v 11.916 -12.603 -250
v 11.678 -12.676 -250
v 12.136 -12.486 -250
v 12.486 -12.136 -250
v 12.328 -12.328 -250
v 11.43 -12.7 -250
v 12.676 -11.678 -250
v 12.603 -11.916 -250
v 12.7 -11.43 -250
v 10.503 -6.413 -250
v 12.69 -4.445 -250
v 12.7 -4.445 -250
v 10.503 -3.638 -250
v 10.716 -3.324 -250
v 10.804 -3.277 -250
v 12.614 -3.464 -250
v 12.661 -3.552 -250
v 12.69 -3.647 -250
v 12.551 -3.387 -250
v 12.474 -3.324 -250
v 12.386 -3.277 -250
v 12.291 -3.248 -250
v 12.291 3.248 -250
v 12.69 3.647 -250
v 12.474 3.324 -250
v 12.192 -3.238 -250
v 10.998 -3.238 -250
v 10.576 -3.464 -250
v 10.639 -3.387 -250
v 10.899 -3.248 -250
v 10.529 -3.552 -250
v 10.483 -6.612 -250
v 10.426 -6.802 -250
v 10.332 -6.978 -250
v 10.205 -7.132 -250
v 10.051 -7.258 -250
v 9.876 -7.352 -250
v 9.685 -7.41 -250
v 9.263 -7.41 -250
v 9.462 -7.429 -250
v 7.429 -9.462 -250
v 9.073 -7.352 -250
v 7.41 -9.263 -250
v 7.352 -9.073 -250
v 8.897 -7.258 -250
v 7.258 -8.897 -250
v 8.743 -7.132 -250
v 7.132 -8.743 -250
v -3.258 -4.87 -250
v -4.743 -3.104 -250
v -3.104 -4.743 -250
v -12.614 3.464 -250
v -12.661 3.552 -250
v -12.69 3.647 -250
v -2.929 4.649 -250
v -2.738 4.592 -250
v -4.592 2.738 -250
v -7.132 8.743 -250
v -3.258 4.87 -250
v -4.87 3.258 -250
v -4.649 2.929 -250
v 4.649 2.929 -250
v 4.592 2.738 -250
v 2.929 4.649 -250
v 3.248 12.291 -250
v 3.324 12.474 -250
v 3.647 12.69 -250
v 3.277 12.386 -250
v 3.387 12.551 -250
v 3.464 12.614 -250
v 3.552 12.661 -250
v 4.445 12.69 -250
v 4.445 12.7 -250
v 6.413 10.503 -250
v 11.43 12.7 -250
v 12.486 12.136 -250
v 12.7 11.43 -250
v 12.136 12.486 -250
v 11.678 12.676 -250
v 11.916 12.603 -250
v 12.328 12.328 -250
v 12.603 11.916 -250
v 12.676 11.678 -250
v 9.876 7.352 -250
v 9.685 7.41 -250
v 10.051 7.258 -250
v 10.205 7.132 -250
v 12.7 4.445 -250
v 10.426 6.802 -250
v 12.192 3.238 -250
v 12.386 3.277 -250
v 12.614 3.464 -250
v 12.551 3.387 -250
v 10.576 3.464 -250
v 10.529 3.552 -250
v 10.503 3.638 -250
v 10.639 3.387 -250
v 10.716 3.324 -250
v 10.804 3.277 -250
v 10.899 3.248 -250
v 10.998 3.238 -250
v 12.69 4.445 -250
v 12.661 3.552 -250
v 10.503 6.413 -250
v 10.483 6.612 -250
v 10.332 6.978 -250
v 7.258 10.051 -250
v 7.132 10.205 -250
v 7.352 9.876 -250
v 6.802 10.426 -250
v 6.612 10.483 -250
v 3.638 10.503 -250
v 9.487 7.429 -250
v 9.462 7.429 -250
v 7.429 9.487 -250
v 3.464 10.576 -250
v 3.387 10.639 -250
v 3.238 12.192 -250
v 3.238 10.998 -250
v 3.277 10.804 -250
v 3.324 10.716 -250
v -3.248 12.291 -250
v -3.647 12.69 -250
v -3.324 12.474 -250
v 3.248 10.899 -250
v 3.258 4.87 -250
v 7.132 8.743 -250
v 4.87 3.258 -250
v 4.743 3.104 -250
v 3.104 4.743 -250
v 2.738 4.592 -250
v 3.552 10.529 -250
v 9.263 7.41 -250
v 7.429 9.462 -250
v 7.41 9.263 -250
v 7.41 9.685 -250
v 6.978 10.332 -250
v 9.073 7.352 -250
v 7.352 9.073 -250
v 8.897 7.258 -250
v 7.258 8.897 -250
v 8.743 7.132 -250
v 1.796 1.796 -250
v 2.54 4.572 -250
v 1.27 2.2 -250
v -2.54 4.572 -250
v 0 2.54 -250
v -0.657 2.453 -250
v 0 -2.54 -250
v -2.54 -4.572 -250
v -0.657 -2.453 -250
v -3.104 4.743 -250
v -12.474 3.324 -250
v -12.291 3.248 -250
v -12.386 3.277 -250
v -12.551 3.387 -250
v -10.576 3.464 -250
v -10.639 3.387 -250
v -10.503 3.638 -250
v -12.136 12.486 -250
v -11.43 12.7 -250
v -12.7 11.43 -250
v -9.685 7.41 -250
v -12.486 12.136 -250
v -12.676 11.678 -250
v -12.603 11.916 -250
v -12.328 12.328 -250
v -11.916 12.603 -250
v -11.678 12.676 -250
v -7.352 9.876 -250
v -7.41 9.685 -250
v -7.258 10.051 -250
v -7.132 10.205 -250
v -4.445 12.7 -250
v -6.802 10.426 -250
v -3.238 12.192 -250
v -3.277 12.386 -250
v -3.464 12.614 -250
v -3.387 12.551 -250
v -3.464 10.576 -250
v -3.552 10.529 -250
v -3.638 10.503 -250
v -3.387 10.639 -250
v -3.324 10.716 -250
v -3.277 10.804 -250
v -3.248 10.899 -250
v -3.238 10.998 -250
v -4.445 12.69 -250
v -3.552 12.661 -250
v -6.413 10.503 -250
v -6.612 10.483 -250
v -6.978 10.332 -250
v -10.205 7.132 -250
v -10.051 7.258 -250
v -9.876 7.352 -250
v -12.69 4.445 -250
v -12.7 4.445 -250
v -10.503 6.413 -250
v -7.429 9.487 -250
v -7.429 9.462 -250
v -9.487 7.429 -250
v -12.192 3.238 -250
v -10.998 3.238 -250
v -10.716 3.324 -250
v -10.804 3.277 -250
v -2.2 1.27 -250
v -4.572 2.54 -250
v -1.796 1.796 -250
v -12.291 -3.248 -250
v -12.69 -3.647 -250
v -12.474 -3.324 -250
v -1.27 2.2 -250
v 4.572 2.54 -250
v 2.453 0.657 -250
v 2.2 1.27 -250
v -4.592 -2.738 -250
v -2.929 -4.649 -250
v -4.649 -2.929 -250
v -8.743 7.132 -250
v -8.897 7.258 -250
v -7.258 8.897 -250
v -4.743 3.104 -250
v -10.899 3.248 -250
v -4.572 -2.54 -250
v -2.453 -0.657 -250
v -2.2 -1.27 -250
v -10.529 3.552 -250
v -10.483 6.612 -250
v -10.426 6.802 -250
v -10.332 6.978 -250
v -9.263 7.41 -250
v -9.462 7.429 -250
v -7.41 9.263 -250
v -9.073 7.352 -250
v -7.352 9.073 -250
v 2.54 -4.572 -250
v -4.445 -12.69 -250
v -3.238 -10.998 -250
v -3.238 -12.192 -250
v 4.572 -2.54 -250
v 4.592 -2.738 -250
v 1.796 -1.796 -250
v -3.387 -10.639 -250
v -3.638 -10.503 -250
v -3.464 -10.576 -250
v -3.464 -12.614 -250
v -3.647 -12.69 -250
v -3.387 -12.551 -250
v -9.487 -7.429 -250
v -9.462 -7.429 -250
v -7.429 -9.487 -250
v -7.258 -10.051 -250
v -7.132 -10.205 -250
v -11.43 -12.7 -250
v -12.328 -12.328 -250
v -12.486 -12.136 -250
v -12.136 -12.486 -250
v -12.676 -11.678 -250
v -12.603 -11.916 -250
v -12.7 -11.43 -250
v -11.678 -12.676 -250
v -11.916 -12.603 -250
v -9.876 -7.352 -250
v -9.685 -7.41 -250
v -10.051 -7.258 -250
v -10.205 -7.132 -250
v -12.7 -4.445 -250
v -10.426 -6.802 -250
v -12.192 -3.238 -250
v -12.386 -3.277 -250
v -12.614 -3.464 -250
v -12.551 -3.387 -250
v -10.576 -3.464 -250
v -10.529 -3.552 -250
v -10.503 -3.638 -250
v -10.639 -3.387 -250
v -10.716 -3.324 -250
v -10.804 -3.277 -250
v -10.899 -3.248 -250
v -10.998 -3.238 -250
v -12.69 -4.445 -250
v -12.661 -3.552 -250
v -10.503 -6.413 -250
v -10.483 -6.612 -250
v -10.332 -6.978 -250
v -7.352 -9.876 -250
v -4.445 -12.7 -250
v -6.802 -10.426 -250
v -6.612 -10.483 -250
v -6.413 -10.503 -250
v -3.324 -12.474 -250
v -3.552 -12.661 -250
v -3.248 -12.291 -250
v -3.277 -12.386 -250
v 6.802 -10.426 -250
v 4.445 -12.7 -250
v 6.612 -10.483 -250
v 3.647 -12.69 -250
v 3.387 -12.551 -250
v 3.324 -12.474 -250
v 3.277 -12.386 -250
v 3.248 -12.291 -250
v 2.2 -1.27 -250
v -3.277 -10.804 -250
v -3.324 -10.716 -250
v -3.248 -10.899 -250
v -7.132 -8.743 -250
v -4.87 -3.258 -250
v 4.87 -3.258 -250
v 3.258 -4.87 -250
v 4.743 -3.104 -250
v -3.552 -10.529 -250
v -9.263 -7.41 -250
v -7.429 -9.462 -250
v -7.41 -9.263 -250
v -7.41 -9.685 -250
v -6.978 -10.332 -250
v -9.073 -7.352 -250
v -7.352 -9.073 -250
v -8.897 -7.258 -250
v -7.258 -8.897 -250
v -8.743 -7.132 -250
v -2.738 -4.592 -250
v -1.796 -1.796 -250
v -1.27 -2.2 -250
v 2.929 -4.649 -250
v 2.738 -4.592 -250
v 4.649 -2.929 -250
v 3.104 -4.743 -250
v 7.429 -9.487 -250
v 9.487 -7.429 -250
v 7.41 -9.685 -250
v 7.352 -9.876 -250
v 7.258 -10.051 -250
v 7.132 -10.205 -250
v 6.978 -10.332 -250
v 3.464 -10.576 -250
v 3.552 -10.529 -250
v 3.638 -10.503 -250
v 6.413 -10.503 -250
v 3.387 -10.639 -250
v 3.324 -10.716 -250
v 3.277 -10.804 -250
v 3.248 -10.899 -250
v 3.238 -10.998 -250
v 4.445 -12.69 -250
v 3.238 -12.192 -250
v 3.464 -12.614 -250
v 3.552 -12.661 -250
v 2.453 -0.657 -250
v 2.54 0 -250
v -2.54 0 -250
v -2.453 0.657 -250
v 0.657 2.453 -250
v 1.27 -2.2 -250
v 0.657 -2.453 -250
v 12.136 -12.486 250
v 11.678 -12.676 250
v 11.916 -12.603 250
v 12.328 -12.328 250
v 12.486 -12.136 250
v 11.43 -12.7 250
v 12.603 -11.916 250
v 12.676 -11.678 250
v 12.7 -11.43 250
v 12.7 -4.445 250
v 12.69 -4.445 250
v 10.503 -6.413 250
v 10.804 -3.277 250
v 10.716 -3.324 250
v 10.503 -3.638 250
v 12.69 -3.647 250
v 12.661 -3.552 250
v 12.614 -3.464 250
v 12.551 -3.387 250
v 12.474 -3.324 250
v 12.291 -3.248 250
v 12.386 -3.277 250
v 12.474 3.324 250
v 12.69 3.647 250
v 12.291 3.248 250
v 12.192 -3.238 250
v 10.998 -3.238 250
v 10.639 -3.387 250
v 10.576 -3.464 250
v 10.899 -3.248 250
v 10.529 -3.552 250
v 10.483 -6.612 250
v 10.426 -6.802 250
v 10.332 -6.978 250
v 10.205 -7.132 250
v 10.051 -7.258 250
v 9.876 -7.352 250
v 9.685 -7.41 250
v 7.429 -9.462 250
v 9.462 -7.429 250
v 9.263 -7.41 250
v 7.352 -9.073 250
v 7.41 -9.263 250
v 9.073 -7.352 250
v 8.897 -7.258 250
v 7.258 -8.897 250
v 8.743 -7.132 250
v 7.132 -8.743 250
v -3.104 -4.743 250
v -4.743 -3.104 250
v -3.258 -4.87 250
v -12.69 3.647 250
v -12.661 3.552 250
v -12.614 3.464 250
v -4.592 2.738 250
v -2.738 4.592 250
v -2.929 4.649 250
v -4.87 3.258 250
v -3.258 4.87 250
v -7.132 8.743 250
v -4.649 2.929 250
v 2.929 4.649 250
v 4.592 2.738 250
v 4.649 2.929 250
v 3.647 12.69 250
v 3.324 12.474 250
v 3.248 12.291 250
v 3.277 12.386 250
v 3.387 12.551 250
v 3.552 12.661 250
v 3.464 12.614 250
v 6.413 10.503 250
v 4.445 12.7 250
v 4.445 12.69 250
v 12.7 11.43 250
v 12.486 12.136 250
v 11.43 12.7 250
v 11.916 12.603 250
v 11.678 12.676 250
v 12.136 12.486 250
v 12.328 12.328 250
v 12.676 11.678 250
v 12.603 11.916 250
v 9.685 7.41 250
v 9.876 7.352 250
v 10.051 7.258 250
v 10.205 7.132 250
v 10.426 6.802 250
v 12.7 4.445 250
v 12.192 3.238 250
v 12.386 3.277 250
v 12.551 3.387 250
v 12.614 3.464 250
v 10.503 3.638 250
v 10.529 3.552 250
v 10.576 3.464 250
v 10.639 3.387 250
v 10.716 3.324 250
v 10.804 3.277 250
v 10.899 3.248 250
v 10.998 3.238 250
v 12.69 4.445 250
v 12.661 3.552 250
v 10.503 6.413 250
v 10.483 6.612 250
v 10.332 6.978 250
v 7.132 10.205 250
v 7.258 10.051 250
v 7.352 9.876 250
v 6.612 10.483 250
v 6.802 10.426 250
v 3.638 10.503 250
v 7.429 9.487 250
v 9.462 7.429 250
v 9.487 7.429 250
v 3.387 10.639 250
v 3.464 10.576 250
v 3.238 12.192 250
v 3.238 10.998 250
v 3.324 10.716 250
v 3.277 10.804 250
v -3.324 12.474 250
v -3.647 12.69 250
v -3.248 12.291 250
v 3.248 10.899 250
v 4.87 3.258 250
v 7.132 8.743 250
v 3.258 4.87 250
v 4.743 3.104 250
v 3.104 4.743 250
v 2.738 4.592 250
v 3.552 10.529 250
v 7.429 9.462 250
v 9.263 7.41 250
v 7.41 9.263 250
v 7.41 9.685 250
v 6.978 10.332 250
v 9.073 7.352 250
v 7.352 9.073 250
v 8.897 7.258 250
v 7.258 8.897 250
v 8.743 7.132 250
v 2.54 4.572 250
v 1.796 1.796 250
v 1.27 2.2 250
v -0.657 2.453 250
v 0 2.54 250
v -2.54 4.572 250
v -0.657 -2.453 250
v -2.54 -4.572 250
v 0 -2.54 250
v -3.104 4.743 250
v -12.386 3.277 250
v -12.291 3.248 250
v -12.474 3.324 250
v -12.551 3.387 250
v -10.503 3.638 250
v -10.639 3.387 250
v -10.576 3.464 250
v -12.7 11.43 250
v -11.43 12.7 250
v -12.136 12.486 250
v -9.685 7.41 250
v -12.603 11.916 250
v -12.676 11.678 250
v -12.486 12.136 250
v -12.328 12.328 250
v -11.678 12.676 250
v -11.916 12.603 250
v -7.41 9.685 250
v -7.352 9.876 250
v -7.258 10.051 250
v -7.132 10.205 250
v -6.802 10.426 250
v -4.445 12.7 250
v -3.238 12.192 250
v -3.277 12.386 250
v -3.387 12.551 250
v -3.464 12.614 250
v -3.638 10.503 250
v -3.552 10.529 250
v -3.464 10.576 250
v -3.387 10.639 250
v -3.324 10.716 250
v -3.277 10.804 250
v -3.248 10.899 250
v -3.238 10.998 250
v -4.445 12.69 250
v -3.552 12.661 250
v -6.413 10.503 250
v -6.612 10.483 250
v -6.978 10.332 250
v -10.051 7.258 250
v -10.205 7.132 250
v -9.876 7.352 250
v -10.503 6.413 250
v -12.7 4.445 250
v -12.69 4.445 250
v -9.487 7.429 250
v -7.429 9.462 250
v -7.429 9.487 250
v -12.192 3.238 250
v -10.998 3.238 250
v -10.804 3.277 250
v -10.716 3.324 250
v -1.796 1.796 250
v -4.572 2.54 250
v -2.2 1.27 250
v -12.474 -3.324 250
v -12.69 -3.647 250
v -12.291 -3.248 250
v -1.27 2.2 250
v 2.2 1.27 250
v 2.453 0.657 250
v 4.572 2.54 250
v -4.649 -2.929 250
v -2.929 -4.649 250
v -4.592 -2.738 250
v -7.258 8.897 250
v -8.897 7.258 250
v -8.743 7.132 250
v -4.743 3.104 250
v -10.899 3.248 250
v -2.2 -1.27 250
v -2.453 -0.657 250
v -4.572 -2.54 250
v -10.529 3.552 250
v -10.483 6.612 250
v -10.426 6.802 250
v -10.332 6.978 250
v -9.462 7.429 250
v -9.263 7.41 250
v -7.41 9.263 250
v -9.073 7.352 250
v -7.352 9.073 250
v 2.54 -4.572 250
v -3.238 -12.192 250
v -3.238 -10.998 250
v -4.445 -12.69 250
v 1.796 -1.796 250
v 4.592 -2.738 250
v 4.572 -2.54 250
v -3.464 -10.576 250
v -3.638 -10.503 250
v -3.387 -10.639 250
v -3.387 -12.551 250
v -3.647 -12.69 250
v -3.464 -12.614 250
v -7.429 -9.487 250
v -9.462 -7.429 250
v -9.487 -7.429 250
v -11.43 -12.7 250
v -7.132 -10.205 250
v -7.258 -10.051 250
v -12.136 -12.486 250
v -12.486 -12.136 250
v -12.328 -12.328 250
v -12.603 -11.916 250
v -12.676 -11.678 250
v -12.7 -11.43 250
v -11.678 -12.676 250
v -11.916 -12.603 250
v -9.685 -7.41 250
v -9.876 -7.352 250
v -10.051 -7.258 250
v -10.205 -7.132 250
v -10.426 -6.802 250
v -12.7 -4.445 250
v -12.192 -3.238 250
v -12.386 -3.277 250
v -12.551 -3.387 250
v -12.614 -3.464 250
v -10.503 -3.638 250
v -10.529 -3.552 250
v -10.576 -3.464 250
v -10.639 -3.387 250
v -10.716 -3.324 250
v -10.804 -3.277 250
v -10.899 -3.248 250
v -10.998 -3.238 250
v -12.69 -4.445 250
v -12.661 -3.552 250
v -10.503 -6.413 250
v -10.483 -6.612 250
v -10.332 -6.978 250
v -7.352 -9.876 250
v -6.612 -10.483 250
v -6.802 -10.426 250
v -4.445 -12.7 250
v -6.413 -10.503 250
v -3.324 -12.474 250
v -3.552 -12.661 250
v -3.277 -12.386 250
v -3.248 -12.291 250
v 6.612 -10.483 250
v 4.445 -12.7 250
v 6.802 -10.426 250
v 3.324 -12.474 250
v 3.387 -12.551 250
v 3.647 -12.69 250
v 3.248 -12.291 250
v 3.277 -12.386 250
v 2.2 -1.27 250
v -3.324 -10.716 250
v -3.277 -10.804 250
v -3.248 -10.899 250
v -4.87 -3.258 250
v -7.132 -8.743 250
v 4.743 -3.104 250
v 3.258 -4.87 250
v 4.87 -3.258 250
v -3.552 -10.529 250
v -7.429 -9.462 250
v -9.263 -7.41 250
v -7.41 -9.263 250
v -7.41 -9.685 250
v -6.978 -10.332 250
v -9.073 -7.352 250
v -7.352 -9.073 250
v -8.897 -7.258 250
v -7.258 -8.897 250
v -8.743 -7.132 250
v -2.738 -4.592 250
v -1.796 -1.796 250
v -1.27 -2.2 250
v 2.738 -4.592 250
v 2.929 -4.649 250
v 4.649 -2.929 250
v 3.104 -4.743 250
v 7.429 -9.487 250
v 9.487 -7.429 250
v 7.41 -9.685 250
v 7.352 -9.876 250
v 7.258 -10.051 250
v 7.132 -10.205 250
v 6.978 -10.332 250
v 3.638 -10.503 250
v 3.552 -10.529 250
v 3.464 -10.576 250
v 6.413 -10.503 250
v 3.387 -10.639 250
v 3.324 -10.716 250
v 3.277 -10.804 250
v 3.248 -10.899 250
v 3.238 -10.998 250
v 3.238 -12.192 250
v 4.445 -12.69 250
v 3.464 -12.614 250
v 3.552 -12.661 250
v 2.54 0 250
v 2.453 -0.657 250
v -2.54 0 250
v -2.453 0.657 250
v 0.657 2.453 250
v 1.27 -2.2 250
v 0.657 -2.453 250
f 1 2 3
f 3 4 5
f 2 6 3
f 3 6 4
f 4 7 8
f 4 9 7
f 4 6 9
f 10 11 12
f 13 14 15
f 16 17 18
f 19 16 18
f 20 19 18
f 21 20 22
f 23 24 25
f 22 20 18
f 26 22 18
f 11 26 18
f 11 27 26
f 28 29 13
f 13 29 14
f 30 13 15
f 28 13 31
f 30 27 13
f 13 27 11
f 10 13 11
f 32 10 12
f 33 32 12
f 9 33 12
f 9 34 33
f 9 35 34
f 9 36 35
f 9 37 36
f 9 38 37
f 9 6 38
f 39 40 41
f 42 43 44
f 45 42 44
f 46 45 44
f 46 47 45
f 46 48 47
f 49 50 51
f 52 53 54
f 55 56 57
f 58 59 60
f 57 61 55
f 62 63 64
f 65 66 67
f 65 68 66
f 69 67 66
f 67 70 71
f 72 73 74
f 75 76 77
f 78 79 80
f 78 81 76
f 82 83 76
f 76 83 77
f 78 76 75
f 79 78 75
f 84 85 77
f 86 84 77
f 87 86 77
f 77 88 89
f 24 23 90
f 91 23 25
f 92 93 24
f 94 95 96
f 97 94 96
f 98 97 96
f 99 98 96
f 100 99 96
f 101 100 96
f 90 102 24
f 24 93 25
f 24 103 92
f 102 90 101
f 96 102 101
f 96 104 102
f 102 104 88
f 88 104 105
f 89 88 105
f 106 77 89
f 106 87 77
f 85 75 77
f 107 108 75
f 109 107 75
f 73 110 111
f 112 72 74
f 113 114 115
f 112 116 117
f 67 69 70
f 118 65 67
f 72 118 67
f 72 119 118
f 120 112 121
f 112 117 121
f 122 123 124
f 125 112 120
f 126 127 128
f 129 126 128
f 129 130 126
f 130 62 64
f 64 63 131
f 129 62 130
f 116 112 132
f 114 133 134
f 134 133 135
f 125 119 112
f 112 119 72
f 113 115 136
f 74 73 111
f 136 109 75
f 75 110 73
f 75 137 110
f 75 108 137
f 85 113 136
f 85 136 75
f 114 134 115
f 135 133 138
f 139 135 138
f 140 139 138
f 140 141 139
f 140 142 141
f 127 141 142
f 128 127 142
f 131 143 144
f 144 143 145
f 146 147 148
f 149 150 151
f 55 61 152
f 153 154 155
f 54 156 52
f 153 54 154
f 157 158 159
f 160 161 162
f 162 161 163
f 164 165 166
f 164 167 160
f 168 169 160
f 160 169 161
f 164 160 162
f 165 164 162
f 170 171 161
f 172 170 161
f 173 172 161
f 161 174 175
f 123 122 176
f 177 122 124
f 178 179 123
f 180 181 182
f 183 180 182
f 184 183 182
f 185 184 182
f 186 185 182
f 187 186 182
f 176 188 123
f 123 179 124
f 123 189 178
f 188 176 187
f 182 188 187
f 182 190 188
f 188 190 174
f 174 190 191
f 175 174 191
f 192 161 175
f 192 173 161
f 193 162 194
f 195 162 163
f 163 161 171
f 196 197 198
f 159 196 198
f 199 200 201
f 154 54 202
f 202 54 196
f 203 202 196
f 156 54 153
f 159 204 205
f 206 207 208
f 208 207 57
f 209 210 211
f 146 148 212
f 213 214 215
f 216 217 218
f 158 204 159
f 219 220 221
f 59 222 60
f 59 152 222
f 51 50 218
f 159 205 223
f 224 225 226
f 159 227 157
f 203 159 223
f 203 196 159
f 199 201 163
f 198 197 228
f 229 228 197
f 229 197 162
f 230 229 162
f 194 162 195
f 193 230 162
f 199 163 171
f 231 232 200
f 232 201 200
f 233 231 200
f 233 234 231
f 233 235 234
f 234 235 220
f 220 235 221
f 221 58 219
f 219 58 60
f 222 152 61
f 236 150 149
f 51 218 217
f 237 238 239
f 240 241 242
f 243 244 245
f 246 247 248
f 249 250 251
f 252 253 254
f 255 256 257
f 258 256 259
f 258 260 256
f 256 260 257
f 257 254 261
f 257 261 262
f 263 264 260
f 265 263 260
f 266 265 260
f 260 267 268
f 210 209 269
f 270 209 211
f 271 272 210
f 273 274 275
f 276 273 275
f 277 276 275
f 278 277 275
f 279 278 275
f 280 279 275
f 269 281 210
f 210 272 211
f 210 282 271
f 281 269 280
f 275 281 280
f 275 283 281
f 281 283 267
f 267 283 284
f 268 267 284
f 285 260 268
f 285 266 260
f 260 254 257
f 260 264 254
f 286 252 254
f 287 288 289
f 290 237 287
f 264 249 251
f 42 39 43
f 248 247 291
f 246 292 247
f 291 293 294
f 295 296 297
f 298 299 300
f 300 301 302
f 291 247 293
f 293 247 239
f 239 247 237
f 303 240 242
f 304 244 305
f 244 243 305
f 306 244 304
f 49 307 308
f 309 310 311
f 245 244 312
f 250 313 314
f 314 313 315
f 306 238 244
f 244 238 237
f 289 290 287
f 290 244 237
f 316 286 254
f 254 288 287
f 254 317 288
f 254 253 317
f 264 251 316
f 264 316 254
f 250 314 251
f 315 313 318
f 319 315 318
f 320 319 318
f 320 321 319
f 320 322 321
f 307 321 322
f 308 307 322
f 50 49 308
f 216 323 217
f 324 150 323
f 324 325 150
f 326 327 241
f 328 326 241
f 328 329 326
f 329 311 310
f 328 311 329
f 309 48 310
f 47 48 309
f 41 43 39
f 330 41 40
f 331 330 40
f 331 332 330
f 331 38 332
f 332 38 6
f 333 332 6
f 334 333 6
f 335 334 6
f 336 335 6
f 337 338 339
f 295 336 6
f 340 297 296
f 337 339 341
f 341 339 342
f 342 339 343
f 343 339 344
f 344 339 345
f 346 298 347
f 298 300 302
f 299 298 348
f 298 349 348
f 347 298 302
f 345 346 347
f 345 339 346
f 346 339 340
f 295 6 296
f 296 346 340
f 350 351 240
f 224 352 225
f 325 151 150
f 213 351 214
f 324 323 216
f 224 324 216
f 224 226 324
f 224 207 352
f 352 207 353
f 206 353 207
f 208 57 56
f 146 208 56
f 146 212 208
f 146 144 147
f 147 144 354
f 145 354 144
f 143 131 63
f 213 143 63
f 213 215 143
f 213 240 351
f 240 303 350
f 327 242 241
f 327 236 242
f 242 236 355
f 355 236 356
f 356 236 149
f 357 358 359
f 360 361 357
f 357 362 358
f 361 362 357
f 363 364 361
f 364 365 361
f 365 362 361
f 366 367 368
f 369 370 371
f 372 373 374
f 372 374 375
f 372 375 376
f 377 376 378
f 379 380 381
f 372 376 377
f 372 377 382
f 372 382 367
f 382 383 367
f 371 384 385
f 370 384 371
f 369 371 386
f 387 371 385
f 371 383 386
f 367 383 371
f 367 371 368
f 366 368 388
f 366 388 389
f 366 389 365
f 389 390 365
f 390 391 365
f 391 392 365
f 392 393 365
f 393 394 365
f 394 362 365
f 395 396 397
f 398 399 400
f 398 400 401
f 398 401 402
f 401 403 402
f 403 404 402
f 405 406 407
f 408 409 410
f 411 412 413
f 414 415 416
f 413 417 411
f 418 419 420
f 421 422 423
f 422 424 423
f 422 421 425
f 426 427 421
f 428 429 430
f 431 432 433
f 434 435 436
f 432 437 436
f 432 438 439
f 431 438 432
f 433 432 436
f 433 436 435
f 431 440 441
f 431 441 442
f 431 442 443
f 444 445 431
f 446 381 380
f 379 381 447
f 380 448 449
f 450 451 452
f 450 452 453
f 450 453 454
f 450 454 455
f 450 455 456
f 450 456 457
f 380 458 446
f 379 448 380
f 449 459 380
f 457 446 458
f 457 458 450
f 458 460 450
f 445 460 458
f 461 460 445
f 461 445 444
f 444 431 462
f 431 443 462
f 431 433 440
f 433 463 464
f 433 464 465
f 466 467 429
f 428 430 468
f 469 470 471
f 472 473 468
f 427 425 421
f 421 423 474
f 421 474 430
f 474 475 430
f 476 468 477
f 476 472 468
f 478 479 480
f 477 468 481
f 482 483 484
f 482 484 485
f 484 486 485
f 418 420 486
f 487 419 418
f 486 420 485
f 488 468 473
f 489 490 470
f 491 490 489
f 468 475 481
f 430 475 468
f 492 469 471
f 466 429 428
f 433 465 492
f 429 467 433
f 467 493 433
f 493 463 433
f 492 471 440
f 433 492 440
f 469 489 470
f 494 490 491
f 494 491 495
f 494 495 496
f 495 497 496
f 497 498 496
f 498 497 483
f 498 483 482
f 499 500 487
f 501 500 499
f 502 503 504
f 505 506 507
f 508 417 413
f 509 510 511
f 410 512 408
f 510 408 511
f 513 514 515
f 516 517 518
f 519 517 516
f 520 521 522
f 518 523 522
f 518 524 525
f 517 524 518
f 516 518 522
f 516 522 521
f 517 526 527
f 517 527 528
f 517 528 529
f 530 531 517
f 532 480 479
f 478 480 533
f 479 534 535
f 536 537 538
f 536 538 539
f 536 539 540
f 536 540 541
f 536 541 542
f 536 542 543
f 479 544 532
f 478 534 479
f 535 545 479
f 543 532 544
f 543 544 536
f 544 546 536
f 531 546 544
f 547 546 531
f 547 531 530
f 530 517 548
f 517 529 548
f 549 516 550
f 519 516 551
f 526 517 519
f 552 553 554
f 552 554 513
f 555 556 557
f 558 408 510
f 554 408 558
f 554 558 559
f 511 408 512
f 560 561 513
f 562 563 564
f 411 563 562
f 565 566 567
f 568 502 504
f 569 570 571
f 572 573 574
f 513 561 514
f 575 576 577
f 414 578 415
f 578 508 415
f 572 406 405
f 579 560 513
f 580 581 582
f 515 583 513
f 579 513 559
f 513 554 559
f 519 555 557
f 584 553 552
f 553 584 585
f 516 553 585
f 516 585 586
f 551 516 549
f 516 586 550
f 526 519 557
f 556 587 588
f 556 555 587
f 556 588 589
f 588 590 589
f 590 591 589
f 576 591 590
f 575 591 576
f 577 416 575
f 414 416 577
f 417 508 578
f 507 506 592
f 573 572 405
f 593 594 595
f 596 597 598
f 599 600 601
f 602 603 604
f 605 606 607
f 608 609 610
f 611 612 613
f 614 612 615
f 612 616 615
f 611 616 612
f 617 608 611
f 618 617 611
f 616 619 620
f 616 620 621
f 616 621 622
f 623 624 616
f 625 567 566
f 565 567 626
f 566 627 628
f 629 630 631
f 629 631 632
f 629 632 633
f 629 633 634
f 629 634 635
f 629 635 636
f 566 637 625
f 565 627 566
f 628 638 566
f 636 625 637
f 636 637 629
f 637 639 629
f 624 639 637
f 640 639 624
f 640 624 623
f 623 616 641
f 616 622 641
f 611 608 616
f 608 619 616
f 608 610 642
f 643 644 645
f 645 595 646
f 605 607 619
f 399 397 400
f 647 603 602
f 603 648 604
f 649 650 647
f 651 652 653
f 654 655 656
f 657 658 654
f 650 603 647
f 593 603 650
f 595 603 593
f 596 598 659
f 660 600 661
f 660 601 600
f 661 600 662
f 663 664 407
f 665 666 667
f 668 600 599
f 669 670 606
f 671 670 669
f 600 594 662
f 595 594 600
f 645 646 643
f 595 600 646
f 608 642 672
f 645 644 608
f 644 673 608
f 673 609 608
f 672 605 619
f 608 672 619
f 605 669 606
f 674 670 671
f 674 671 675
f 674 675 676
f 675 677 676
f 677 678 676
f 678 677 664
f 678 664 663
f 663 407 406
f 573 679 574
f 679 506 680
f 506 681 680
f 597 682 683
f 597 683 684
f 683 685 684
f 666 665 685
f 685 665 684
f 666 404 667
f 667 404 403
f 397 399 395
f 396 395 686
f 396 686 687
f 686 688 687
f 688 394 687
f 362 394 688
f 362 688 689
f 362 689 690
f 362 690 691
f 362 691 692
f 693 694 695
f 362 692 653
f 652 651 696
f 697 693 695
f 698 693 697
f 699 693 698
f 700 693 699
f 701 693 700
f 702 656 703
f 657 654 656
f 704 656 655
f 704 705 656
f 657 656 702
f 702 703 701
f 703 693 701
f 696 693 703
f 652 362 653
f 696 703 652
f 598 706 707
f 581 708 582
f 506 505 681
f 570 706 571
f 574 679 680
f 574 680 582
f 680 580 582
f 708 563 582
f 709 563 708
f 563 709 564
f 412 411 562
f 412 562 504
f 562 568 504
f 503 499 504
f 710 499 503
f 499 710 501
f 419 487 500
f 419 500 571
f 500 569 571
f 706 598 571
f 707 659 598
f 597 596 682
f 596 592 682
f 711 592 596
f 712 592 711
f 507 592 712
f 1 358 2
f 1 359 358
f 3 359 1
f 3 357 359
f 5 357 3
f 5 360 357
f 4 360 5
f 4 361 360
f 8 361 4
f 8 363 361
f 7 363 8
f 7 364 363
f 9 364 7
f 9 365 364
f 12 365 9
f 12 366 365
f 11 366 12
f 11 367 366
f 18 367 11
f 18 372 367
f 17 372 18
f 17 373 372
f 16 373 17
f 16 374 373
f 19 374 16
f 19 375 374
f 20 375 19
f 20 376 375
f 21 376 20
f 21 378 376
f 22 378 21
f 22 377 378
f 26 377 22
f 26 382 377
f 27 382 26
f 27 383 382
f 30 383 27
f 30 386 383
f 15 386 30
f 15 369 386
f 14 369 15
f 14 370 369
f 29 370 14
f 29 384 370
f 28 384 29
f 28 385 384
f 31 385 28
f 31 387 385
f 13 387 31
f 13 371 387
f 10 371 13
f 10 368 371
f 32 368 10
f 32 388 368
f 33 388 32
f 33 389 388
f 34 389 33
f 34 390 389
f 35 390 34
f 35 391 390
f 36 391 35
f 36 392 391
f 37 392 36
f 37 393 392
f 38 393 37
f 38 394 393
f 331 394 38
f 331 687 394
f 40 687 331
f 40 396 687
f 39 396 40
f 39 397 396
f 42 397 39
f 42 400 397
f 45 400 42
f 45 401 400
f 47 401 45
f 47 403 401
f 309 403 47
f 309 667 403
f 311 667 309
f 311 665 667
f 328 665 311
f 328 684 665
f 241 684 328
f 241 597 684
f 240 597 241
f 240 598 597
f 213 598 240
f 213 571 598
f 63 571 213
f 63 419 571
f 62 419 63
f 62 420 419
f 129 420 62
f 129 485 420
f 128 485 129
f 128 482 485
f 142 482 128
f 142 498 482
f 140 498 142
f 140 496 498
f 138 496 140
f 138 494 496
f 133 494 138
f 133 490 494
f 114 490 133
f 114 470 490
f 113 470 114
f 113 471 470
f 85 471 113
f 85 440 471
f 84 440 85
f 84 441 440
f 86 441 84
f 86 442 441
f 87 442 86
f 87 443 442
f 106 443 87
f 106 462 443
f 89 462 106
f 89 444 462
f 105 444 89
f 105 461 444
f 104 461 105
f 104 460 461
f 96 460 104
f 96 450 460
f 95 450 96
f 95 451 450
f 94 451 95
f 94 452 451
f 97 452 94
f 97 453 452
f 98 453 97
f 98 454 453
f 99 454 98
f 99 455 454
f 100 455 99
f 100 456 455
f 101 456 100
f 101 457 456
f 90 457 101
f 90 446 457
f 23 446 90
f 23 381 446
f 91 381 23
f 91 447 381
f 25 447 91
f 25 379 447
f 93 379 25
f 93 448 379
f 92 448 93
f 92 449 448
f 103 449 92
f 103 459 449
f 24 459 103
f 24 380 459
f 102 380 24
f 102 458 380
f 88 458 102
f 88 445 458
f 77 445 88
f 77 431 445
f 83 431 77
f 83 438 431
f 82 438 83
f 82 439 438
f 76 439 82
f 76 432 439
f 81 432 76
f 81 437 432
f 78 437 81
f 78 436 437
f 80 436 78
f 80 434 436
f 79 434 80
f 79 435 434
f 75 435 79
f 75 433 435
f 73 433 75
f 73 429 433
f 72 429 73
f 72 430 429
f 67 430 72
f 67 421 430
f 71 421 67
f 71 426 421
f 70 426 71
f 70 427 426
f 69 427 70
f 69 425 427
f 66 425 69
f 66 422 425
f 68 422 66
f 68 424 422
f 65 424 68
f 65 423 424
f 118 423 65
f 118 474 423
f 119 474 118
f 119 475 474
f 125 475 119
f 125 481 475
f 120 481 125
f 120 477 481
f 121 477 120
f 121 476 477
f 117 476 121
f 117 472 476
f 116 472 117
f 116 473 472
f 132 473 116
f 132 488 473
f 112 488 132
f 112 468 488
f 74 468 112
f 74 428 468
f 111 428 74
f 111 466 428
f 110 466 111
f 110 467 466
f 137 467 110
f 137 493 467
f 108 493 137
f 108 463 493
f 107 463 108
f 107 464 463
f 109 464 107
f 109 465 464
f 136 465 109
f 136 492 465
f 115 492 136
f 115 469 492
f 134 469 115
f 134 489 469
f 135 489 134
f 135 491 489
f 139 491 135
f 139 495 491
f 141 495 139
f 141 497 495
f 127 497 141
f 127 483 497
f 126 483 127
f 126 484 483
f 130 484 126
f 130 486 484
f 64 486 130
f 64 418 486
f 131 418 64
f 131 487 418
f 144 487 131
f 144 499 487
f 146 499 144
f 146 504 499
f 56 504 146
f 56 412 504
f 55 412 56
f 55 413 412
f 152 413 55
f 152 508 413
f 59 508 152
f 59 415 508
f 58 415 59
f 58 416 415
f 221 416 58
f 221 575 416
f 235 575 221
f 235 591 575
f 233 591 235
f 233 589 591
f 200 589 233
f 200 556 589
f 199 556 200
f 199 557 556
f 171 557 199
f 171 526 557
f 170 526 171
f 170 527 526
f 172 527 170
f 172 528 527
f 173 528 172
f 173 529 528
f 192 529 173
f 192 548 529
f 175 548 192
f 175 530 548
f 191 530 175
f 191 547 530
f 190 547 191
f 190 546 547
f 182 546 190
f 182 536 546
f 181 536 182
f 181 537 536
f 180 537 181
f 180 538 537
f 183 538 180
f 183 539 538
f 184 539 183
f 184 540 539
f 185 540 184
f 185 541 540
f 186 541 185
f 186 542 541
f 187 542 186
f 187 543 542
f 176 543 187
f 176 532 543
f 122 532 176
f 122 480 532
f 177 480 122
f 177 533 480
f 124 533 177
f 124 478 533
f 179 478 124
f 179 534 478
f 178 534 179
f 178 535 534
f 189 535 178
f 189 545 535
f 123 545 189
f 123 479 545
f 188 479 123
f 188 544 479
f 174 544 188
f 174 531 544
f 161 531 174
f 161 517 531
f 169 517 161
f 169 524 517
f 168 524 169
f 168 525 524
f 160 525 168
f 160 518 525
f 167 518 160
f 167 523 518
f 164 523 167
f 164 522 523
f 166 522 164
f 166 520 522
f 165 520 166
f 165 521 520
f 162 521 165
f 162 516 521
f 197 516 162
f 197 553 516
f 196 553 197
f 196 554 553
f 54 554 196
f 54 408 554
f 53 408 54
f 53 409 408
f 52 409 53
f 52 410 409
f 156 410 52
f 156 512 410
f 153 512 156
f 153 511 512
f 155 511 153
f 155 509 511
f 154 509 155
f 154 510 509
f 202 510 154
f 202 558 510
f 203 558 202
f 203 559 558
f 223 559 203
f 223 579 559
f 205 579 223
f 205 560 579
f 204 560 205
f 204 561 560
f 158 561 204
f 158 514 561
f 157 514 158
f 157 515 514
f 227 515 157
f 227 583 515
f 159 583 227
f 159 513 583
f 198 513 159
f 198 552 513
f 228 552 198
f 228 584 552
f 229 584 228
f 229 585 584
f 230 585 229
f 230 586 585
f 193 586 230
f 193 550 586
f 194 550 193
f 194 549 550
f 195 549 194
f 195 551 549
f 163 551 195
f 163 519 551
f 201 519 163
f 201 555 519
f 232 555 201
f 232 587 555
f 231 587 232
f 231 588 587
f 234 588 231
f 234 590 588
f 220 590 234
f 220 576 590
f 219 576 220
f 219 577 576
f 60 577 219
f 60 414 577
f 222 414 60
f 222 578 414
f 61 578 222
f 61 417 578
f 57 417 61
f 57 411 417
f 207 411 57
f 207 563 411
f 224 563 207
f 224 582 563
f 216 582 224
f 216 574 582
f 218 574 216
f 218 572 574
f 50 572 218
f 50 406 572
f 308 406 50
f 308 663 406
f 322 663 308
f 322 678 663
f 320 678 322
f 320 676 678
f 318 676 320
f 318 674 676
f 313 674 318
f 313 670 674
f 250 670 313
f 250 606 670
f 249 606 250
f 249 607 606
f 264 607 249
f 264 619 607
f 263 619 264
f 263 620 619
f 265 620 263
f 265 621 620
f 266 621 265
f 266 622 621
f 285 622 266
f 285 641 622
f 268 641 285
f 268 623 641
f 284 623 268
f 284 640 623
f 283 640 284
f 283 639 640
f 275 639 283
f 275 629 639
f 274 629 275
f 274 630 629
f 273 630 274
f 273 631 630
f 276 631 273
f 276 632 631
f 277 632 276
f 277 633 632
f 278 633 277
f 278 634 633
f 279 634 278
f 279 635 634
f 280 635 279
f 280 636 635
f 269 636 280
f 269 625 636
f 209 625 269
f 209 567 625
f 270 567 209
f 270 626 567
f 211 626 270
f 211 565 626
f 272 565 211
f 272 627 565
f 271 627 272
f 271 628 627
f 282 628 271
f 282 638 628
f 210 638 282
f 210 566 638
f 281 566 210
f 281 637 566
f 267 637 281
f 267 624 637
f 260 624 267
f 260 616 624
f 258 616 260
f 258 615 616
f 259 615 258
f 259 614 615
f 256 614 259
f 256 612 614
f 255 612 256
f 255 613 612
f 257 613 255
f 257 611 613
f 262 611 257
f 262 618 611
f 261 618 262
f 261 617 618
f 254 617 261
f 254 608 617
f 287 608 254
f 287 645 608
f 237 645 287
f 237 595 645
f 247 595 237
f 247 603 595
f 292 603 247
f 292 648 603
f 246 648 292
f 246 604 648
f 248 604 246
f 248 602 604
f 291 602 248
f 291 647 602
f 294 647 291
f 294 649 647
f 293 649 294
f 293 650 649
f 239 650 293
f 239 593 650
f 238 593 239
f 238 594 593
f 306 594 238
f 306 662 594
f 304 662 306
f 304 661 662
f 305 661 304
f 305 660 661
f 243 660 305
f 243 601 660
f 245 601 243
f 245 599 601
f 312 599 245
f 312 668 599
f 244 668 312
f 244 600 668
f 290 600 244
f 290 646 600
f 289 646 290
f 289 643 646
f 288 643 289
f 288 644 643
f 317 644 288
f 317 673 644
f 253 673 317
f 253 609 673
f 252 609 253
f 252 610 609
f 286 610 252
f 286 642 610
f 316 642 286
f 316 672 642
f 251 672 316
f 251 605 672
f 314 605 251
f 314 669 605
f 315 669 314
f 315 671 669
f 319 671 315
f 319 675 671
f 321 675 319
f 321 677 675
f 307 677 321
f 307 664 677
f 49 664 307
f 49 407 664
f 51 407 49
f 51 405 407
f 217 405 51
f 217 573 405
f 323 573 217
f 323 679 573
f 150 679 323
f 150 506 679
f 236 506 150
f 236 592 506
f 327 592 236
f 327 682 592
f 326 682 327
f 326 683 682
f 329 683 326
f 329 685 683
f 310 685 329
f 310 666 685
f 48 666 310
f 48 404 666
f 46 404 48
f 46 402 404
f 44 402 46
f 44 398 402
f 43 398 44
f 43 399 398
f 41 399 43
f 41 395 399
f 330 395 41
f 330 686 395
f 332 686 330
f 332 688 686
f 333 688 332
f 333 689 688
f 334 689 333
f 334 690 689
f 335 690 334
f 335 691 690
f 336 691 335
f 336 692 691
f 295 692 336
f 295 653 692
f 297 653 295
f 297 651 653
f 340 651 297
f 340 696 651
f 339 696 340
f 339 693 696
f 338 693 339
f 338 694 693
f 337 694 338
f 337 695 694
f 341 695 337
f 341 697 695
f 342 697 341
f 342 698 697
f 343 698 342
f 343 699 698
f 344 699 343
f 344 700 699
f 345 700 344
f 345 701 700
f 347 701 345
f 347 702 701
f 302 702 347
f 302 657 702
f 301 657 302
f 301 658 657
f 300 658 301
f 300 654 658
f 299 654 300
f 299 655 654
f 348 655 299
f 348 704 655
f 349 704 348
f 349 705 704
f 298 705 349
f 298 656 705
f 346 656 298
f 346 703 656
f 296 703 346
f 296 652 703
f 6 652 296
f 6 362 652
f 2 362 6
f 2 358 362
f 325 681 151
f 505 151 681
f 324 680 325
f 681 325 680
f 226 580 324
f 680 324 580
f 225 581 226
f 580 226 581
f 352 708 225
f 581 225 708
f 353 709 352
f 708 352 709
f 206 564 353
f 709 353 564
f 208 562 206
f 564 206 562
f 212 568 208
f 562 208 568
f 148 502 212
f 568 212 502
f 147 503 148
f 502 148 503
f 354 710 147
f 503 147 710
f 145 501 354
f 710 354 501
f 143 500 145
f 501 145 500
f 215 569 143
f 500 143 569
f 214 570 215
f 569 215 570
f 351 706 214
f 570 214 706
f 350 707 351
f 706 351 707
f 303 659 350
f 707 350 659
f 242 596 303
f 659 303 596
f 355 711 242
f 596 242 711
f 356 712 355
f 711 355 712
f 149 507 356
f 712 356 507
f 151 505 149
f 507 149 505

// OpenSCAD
/*
*   Generic library for fractional t-slot extrusions.
*   Rev. 1
*
*  Creative Commons Share Alike 3.0
*  Copyright (c) 2013 David Lee Miller
* 
*/

minkR_TS = 0.04*25.4;   // minkowski radius for the t-slot
minkR_IC = 0.075*25.4;   // minkowski radius for the inner cutout
minkR_PF = 0.05*25.4;   // minkowski radius for the profile corners

1010Profile(500);
//1020Profile(100);
//1030Profile(100);
//2020Profile(100);
//2040Profile(100);


module fillet(rad){
	translate([-rad,-rad,0])
	difference(){
		translate([0,0,0]) square([rad+0.01,rad+0.01]);
		circle(r=rad,center=true,$fn=32);
	}
}

module insideCutout(){
	minkowski(){
		translate([0,0,0]) circle(r=minkR_IC,center=true,$fn=32);
		hull(){
			square([0.2*25.4-minkR_IC,0.645*25.4-2*minkR_IC],center=true);
			square([0.8*25.4-2*minkR_IC,0.001*25.4],center=true);
		}
	}
}

module doubleCutout(){
	union(){
		minkowski(){
			translate([0,0,0]) circle(r=minkR_IC,center=true,$fn=32);
			union(){
			rotate([0,0,0]) hull(){
				translate([-0.5*25.4,0,0]) hull(){
					square([0.2*25.4-minkR_IC,0.645*25.4-2*minkR_IC],center=true);
					square([0.8*25.4-2*minkR_IC,0.001*25.4],center=true);
				}
				translate([0.5*25.4,0,0]) hull(){
					square([0.2*25.4-minkR_IC,0.645*25.4-2*minkR_IC],center=true);
					square([0.8*25.4-2*minkR_IC,0.001*25.4],center=true);
				}
			}
			rotate([0,0,90]) hull(){
				translate([-0.5*25.4,0,0]) hull(){
					square([0.2*25.4-minkR_IC,0.645*25.4-2*minkR_IC],center=true);
					square([0.8*25.4-2*minkR_IC,0.001*25.4],center=true);
				}
				translate([0.5*25.4,0,0]) hull(){
					square([0.2*25.4-minkR_IC,0.645*25.4-2*minkR_IC],center=true);
					square([0.8*25.4-2*minkR_IC,0.001*25.4],center=true);
				}
			}}
		}
		rotate([0,0,0]) translate([-0.645*25.4/2,-0.645*25.4/2,0]) fillet(minkR_IC);
		rotate([0,0,180]) translate([-0.645*25.4/2,-0.645*25.4/2,0]) fillet(minkR_IC);
		rotate([0,0,90]) translate([-0.645*25.4/2,-0.645*25.4/2,0]) fillet(minkR_IC);
		rotate([0,0,-90]) translate([-0.645*25.4/2,-0.645*25.4/2,0]) fillet(minkR_IC);
	}
}

module tSlot(){
	union(){
		translate([minkR_TS,0,0])
		minkowski(){
			translate([0,0,0]) circle(r=minkR_TS,center=true,$fn=32);
			hull(){
				square([0.001*25.4,0.585*25.4-2*minkR_TS],center=true);
				translate([(0.233*25.4-2*minkR_TS)/2,0,0]) square([0.233*25.4-2*minkR_TS,0.2*25.4],center=true);
			}
		}
	translate([-0.255*25.4/2+0.01,0,0]) square(0.255*25.4,center=true);
	translate([-0.35*25.4/2-0.087*25.4+0.01,0,0]) square(0.35*25.4,center=true);
	translate([0,-0.255*25.4/2,0]) fillet(minkR_TS/2);
	translate([-0.087*25.4,-.255*25.4/2,0]) rotate([0,0,90]) fillet(minkR_TS/2);
	scale([1,-1,1]) translate([0,-0.255*25.4/2,0]) fillet(minkR_TS/2);
	scale([1,-1,1]) translate([-0.087*25.4,-.255*25.4/2,0]) rotate([0,0,90]) fillet(minkR_TS/2);
	}
}

module 1010Profile(height){
	linear_extrude(height=height,center=true)
	union(){
	difference(){
		minkowski(){
			translate([0,0,0]) circle(r=minkR_PF,center=true,$fn=32);
			square([1*25.4-2*minkR_PF,1*25.4-2*minkR_PF],center=true);
		}
		translate([0,0,0]) circle(r=0.2*25.4/2,$fn=24);
		translate([-0.5*25.4+0.087*25.4,0,0]) tSlot();
		rotate([0,0,180]) translate([-0.5*25.4+0.087*25.4,0,0]) tSlot();
		translate([0,-0.5*25.4+0.087*25.4,0]) rotate([0,0,90]) tSlot();
		translate([0,0.5*25.4-0.087*25.4,0]) rotate([0,0,-90]) tSlot();
	}}
}

module 1020Profile(height){
	linear_extrude(height=height,center=true)
	difference(){
		minkowski(){
			translate([0,0,0]) circle(r=minkR_PF,center=true,$fn=32);
			square([1*25.4-2*minkR_PF,2*25.4-2*minkR_PF],center=true);
		}
		translate([0,0.5*25.4,0]) circle(r=0.2*25.4/2,$fn=24);
		translate([0,-0.5*25.4,0]) circle(r=0.2*25.4/2,$fn=24);
		translate([0,0,0]) insideCutout();
		translate([-0.5*25.4+0.087*25.4,0.5*25.4,0]) tSlot();
		rotate([0,0,180]) translate([-0.5*25.4+0.087*25.4,0.5*25.4,0]) tSlot();
		translate([-0.5*25.4+0.087*25.4,-0.5*25.4,0]) tSlot();
		rotate([0,0,180]) translate([-0.5*25.4+0.087*25.4,-0.5*25.4,0]) tSlot();
		translate([0,-1*25.4+0.087*25.4,0]) rotate([0,0,90]) tSlot();
		translate([0,1*25.4-0.087*25.4,0]) rotate([0,0,-90]) tSlot();
	}
}

module 1030Profile(height){
	linear_extrude(height=height,center=true)
	difference(){
		minkowski(){
			translate([0,0,0]) circle(r=minkR_PF,center=true,$fn=32);
			square([1*25.4-2*minkR_PF,3*25.4-2*minkR_PF],center=true);
		}
		translate([0,0,0]) circle(r=0.2*25.4/2,$fn=24);
		translate([0,1*25.4,0]) circle(r=0.2*25.4/2,$fn=24);
		translate([0,-1*25.4,0]) circle(r=0.2*25.4/2,$fn=24);
		translate([0,-0.5*25.4,0]) insideCutout();
		translate([0,0.5*25.4,0]) insideCutout();
		translate([-0.5*25.4+0.087*25.4,0,0]) tSlot();
		rotate([0,0,180]) translate([-0.5*25.4+0.087*25.4,0,0]) tSlot();
		translate([-0.5*25.4+0.087*25.4,1*25.4,0]) tSlot();
		rotate([0,0,180]) translate([-0.5*25.4+0.087*25.4,1*25.4,0]) tSlot();
		translate([-0.5*25.4+0.087*25.4,-1*25.4,0]) tSlot();
		rotate([0,0,180]) translate([-0.5*25.4+0.087*25.4,-1*25.4,0]) tSlot();
		translate([0,-1.5*25.4+0.087*25.4,0]) rotate([0,0,90]) tSlot();
		translate([0,1.5*25.4-0.087*25.4,0]) rotate([0,0,-90]) tSlot();
	}
}

module 2020Profile(height){
	linear_extrude(height=height,center=true)
	difference(){
		minkowski(){
			translate([0,0,0]) circle(r=minkR_PF,center=true,$fn=32);
			square([2*25.4-2*minkR_PF,2*25.4-2*minkR_PF],center=true);
		}
		translate([0.5*25.4,0.5*25.4,0]) circle(r=0.2*25.4/2,$fn=24);
		translate([-0.5*25.4,0.5*25.4,0]) circle(r=0.2*25.4/2,$fn=24);
		translate([0.5*25.4,-0.5*25.4,0]) circle(r=0.2*25.4/2,$fn=24);
		translate([-0.5*25.4,-0.5*25.4,0]) circle(r=0.2*25.4/2,$fn=24);
		translate([0,0,0]) doubleCutout();
		translate([-1*25.4+0.087*25.4,0.5*25.4,0]) tSlot();
		rotate([0,0,180]) translate([-1*25.4+0.087*25.4,0.5*25.4,0]) tSlot();
		translate([-1*25.4+0.087*25.4,-0.5*25.4,0]) tSlot();
		rotate([0,0,180]) translate([-1*25.4+0.087*25.4,-0.5*25.4,0]) tSlot();
		translate([-0.5*25.4,1*25.4-0.087*25.4,0]) rotate([0,0,-90]) tSlot();
		rotate([0,0,180]) translate([-0.5*25.4,1*25.4-0.087*25.4,0]) rotate([0,0,-90]) tSlot();
		translate([0.5*25.4,1*25.4-0.087*25.4,0]) rotate([0,0,-90]) tSlot();
		rotate([0,0,180]) translate([0.5*25.4,1*25.4-0.087*25.4,0]) rotate([0,0,-90]) tSlot();
	}
}

module 2040Profile(height){
	linear_extrude(height=height,center=true)
	difference(){
		minkowski(){
			translate([0,0,0]) circle(r=minkR_PF,center=true,$fn=32);
			square([2*25.4-2*minkR_PF,4*25.4-2*minkR_PF],center=true);
		}
		translate([0.5*25.4,1.5*25.4,0]) circle(r=0.2*25.4/2,$fn=24);
		translate([-0.5*25.4,1.5*25.4,0]) circle(r=0.2*25.4/2,$fn=24);
		translate([0.5*25.4,0.5*25.4,0]) circle(r=0.2*25.4/2,$fn=24);
		translate([-0.5*25.4,0.5*25.4,0]) circle(r=0.2*25.4/2,$fn=24);
		translate([0.5*25.4,-1.5*25.4,0]) circle(r=0.2*25.4/2,$fn=24);
		translate([-0.5*25.4,-1.5*25.4,0]) circle(r=0.2*25.4/2,$fn=24);
		translate([0.5*25.4,-0.5*25.4,0]) circle(r=0.2*25.4/2,$fn=24);
		translate([-0.5*25.4,-0.5*25.4,0]) circle(r=0.2*25.4/2,$fn=24);
		translate([0,1*25.4,0]) doubleCutout();
		translate([0,-1*25.4,0]) doubleCutout();
		translate([0.5*25.4,0,0]) insideCutout();
		translate([-0.5*25.4,0,0]) insideCutout();
		translate([-1*25.4+0.087*25.4,0.5*25.4,0]) tSlot();
		rotate([0,0,180]) translate([-1*25.4+0.087*25.4,0.5*25.4,0]) tSlot();
		translate([-1*25.4+0.087*25.4,-0.5*25.4,0]) tSlot();
		rotate([0,0,180]) translate([-1*25.4+0.087*25.4,-0.5*25.4,0]) tSlot();
		translate([-1*25.4+0.087*25.4,1.5*25.4,0]) tSlot();
		rotate([0,0,180]) translate([-1*25.4+0.087*25.4,1.5*25.4,0]) tSlot();
		translate([-1*25.4+0.087*25.4,-1.5*25.4,0]) tSlot();
		rotate([0,0,180]) translate([-1*25.4+0.087*25.4,-1.5*25.4,0]) tSlot();
		translate([-0.5*25.4,2*25.4-0.087*25.4,0]) rotate([0,0,-90]) tSlot();
		rotate([0,0,180]) translate([-0.5*25.4,2*25.4-0.087*25.4,0]) rotate([0,0,-90]) tSlot();
		translate([0.5*25.4,2*25.4-0.087*25.4,0]) rotate([0,0,-90]) tSlot();
		rotate([0,0,180]) translate([0.5*25.4,2*25.4-0.087*25.4,0]) rotate([0,0,-90]) tSlot();
	}
}
